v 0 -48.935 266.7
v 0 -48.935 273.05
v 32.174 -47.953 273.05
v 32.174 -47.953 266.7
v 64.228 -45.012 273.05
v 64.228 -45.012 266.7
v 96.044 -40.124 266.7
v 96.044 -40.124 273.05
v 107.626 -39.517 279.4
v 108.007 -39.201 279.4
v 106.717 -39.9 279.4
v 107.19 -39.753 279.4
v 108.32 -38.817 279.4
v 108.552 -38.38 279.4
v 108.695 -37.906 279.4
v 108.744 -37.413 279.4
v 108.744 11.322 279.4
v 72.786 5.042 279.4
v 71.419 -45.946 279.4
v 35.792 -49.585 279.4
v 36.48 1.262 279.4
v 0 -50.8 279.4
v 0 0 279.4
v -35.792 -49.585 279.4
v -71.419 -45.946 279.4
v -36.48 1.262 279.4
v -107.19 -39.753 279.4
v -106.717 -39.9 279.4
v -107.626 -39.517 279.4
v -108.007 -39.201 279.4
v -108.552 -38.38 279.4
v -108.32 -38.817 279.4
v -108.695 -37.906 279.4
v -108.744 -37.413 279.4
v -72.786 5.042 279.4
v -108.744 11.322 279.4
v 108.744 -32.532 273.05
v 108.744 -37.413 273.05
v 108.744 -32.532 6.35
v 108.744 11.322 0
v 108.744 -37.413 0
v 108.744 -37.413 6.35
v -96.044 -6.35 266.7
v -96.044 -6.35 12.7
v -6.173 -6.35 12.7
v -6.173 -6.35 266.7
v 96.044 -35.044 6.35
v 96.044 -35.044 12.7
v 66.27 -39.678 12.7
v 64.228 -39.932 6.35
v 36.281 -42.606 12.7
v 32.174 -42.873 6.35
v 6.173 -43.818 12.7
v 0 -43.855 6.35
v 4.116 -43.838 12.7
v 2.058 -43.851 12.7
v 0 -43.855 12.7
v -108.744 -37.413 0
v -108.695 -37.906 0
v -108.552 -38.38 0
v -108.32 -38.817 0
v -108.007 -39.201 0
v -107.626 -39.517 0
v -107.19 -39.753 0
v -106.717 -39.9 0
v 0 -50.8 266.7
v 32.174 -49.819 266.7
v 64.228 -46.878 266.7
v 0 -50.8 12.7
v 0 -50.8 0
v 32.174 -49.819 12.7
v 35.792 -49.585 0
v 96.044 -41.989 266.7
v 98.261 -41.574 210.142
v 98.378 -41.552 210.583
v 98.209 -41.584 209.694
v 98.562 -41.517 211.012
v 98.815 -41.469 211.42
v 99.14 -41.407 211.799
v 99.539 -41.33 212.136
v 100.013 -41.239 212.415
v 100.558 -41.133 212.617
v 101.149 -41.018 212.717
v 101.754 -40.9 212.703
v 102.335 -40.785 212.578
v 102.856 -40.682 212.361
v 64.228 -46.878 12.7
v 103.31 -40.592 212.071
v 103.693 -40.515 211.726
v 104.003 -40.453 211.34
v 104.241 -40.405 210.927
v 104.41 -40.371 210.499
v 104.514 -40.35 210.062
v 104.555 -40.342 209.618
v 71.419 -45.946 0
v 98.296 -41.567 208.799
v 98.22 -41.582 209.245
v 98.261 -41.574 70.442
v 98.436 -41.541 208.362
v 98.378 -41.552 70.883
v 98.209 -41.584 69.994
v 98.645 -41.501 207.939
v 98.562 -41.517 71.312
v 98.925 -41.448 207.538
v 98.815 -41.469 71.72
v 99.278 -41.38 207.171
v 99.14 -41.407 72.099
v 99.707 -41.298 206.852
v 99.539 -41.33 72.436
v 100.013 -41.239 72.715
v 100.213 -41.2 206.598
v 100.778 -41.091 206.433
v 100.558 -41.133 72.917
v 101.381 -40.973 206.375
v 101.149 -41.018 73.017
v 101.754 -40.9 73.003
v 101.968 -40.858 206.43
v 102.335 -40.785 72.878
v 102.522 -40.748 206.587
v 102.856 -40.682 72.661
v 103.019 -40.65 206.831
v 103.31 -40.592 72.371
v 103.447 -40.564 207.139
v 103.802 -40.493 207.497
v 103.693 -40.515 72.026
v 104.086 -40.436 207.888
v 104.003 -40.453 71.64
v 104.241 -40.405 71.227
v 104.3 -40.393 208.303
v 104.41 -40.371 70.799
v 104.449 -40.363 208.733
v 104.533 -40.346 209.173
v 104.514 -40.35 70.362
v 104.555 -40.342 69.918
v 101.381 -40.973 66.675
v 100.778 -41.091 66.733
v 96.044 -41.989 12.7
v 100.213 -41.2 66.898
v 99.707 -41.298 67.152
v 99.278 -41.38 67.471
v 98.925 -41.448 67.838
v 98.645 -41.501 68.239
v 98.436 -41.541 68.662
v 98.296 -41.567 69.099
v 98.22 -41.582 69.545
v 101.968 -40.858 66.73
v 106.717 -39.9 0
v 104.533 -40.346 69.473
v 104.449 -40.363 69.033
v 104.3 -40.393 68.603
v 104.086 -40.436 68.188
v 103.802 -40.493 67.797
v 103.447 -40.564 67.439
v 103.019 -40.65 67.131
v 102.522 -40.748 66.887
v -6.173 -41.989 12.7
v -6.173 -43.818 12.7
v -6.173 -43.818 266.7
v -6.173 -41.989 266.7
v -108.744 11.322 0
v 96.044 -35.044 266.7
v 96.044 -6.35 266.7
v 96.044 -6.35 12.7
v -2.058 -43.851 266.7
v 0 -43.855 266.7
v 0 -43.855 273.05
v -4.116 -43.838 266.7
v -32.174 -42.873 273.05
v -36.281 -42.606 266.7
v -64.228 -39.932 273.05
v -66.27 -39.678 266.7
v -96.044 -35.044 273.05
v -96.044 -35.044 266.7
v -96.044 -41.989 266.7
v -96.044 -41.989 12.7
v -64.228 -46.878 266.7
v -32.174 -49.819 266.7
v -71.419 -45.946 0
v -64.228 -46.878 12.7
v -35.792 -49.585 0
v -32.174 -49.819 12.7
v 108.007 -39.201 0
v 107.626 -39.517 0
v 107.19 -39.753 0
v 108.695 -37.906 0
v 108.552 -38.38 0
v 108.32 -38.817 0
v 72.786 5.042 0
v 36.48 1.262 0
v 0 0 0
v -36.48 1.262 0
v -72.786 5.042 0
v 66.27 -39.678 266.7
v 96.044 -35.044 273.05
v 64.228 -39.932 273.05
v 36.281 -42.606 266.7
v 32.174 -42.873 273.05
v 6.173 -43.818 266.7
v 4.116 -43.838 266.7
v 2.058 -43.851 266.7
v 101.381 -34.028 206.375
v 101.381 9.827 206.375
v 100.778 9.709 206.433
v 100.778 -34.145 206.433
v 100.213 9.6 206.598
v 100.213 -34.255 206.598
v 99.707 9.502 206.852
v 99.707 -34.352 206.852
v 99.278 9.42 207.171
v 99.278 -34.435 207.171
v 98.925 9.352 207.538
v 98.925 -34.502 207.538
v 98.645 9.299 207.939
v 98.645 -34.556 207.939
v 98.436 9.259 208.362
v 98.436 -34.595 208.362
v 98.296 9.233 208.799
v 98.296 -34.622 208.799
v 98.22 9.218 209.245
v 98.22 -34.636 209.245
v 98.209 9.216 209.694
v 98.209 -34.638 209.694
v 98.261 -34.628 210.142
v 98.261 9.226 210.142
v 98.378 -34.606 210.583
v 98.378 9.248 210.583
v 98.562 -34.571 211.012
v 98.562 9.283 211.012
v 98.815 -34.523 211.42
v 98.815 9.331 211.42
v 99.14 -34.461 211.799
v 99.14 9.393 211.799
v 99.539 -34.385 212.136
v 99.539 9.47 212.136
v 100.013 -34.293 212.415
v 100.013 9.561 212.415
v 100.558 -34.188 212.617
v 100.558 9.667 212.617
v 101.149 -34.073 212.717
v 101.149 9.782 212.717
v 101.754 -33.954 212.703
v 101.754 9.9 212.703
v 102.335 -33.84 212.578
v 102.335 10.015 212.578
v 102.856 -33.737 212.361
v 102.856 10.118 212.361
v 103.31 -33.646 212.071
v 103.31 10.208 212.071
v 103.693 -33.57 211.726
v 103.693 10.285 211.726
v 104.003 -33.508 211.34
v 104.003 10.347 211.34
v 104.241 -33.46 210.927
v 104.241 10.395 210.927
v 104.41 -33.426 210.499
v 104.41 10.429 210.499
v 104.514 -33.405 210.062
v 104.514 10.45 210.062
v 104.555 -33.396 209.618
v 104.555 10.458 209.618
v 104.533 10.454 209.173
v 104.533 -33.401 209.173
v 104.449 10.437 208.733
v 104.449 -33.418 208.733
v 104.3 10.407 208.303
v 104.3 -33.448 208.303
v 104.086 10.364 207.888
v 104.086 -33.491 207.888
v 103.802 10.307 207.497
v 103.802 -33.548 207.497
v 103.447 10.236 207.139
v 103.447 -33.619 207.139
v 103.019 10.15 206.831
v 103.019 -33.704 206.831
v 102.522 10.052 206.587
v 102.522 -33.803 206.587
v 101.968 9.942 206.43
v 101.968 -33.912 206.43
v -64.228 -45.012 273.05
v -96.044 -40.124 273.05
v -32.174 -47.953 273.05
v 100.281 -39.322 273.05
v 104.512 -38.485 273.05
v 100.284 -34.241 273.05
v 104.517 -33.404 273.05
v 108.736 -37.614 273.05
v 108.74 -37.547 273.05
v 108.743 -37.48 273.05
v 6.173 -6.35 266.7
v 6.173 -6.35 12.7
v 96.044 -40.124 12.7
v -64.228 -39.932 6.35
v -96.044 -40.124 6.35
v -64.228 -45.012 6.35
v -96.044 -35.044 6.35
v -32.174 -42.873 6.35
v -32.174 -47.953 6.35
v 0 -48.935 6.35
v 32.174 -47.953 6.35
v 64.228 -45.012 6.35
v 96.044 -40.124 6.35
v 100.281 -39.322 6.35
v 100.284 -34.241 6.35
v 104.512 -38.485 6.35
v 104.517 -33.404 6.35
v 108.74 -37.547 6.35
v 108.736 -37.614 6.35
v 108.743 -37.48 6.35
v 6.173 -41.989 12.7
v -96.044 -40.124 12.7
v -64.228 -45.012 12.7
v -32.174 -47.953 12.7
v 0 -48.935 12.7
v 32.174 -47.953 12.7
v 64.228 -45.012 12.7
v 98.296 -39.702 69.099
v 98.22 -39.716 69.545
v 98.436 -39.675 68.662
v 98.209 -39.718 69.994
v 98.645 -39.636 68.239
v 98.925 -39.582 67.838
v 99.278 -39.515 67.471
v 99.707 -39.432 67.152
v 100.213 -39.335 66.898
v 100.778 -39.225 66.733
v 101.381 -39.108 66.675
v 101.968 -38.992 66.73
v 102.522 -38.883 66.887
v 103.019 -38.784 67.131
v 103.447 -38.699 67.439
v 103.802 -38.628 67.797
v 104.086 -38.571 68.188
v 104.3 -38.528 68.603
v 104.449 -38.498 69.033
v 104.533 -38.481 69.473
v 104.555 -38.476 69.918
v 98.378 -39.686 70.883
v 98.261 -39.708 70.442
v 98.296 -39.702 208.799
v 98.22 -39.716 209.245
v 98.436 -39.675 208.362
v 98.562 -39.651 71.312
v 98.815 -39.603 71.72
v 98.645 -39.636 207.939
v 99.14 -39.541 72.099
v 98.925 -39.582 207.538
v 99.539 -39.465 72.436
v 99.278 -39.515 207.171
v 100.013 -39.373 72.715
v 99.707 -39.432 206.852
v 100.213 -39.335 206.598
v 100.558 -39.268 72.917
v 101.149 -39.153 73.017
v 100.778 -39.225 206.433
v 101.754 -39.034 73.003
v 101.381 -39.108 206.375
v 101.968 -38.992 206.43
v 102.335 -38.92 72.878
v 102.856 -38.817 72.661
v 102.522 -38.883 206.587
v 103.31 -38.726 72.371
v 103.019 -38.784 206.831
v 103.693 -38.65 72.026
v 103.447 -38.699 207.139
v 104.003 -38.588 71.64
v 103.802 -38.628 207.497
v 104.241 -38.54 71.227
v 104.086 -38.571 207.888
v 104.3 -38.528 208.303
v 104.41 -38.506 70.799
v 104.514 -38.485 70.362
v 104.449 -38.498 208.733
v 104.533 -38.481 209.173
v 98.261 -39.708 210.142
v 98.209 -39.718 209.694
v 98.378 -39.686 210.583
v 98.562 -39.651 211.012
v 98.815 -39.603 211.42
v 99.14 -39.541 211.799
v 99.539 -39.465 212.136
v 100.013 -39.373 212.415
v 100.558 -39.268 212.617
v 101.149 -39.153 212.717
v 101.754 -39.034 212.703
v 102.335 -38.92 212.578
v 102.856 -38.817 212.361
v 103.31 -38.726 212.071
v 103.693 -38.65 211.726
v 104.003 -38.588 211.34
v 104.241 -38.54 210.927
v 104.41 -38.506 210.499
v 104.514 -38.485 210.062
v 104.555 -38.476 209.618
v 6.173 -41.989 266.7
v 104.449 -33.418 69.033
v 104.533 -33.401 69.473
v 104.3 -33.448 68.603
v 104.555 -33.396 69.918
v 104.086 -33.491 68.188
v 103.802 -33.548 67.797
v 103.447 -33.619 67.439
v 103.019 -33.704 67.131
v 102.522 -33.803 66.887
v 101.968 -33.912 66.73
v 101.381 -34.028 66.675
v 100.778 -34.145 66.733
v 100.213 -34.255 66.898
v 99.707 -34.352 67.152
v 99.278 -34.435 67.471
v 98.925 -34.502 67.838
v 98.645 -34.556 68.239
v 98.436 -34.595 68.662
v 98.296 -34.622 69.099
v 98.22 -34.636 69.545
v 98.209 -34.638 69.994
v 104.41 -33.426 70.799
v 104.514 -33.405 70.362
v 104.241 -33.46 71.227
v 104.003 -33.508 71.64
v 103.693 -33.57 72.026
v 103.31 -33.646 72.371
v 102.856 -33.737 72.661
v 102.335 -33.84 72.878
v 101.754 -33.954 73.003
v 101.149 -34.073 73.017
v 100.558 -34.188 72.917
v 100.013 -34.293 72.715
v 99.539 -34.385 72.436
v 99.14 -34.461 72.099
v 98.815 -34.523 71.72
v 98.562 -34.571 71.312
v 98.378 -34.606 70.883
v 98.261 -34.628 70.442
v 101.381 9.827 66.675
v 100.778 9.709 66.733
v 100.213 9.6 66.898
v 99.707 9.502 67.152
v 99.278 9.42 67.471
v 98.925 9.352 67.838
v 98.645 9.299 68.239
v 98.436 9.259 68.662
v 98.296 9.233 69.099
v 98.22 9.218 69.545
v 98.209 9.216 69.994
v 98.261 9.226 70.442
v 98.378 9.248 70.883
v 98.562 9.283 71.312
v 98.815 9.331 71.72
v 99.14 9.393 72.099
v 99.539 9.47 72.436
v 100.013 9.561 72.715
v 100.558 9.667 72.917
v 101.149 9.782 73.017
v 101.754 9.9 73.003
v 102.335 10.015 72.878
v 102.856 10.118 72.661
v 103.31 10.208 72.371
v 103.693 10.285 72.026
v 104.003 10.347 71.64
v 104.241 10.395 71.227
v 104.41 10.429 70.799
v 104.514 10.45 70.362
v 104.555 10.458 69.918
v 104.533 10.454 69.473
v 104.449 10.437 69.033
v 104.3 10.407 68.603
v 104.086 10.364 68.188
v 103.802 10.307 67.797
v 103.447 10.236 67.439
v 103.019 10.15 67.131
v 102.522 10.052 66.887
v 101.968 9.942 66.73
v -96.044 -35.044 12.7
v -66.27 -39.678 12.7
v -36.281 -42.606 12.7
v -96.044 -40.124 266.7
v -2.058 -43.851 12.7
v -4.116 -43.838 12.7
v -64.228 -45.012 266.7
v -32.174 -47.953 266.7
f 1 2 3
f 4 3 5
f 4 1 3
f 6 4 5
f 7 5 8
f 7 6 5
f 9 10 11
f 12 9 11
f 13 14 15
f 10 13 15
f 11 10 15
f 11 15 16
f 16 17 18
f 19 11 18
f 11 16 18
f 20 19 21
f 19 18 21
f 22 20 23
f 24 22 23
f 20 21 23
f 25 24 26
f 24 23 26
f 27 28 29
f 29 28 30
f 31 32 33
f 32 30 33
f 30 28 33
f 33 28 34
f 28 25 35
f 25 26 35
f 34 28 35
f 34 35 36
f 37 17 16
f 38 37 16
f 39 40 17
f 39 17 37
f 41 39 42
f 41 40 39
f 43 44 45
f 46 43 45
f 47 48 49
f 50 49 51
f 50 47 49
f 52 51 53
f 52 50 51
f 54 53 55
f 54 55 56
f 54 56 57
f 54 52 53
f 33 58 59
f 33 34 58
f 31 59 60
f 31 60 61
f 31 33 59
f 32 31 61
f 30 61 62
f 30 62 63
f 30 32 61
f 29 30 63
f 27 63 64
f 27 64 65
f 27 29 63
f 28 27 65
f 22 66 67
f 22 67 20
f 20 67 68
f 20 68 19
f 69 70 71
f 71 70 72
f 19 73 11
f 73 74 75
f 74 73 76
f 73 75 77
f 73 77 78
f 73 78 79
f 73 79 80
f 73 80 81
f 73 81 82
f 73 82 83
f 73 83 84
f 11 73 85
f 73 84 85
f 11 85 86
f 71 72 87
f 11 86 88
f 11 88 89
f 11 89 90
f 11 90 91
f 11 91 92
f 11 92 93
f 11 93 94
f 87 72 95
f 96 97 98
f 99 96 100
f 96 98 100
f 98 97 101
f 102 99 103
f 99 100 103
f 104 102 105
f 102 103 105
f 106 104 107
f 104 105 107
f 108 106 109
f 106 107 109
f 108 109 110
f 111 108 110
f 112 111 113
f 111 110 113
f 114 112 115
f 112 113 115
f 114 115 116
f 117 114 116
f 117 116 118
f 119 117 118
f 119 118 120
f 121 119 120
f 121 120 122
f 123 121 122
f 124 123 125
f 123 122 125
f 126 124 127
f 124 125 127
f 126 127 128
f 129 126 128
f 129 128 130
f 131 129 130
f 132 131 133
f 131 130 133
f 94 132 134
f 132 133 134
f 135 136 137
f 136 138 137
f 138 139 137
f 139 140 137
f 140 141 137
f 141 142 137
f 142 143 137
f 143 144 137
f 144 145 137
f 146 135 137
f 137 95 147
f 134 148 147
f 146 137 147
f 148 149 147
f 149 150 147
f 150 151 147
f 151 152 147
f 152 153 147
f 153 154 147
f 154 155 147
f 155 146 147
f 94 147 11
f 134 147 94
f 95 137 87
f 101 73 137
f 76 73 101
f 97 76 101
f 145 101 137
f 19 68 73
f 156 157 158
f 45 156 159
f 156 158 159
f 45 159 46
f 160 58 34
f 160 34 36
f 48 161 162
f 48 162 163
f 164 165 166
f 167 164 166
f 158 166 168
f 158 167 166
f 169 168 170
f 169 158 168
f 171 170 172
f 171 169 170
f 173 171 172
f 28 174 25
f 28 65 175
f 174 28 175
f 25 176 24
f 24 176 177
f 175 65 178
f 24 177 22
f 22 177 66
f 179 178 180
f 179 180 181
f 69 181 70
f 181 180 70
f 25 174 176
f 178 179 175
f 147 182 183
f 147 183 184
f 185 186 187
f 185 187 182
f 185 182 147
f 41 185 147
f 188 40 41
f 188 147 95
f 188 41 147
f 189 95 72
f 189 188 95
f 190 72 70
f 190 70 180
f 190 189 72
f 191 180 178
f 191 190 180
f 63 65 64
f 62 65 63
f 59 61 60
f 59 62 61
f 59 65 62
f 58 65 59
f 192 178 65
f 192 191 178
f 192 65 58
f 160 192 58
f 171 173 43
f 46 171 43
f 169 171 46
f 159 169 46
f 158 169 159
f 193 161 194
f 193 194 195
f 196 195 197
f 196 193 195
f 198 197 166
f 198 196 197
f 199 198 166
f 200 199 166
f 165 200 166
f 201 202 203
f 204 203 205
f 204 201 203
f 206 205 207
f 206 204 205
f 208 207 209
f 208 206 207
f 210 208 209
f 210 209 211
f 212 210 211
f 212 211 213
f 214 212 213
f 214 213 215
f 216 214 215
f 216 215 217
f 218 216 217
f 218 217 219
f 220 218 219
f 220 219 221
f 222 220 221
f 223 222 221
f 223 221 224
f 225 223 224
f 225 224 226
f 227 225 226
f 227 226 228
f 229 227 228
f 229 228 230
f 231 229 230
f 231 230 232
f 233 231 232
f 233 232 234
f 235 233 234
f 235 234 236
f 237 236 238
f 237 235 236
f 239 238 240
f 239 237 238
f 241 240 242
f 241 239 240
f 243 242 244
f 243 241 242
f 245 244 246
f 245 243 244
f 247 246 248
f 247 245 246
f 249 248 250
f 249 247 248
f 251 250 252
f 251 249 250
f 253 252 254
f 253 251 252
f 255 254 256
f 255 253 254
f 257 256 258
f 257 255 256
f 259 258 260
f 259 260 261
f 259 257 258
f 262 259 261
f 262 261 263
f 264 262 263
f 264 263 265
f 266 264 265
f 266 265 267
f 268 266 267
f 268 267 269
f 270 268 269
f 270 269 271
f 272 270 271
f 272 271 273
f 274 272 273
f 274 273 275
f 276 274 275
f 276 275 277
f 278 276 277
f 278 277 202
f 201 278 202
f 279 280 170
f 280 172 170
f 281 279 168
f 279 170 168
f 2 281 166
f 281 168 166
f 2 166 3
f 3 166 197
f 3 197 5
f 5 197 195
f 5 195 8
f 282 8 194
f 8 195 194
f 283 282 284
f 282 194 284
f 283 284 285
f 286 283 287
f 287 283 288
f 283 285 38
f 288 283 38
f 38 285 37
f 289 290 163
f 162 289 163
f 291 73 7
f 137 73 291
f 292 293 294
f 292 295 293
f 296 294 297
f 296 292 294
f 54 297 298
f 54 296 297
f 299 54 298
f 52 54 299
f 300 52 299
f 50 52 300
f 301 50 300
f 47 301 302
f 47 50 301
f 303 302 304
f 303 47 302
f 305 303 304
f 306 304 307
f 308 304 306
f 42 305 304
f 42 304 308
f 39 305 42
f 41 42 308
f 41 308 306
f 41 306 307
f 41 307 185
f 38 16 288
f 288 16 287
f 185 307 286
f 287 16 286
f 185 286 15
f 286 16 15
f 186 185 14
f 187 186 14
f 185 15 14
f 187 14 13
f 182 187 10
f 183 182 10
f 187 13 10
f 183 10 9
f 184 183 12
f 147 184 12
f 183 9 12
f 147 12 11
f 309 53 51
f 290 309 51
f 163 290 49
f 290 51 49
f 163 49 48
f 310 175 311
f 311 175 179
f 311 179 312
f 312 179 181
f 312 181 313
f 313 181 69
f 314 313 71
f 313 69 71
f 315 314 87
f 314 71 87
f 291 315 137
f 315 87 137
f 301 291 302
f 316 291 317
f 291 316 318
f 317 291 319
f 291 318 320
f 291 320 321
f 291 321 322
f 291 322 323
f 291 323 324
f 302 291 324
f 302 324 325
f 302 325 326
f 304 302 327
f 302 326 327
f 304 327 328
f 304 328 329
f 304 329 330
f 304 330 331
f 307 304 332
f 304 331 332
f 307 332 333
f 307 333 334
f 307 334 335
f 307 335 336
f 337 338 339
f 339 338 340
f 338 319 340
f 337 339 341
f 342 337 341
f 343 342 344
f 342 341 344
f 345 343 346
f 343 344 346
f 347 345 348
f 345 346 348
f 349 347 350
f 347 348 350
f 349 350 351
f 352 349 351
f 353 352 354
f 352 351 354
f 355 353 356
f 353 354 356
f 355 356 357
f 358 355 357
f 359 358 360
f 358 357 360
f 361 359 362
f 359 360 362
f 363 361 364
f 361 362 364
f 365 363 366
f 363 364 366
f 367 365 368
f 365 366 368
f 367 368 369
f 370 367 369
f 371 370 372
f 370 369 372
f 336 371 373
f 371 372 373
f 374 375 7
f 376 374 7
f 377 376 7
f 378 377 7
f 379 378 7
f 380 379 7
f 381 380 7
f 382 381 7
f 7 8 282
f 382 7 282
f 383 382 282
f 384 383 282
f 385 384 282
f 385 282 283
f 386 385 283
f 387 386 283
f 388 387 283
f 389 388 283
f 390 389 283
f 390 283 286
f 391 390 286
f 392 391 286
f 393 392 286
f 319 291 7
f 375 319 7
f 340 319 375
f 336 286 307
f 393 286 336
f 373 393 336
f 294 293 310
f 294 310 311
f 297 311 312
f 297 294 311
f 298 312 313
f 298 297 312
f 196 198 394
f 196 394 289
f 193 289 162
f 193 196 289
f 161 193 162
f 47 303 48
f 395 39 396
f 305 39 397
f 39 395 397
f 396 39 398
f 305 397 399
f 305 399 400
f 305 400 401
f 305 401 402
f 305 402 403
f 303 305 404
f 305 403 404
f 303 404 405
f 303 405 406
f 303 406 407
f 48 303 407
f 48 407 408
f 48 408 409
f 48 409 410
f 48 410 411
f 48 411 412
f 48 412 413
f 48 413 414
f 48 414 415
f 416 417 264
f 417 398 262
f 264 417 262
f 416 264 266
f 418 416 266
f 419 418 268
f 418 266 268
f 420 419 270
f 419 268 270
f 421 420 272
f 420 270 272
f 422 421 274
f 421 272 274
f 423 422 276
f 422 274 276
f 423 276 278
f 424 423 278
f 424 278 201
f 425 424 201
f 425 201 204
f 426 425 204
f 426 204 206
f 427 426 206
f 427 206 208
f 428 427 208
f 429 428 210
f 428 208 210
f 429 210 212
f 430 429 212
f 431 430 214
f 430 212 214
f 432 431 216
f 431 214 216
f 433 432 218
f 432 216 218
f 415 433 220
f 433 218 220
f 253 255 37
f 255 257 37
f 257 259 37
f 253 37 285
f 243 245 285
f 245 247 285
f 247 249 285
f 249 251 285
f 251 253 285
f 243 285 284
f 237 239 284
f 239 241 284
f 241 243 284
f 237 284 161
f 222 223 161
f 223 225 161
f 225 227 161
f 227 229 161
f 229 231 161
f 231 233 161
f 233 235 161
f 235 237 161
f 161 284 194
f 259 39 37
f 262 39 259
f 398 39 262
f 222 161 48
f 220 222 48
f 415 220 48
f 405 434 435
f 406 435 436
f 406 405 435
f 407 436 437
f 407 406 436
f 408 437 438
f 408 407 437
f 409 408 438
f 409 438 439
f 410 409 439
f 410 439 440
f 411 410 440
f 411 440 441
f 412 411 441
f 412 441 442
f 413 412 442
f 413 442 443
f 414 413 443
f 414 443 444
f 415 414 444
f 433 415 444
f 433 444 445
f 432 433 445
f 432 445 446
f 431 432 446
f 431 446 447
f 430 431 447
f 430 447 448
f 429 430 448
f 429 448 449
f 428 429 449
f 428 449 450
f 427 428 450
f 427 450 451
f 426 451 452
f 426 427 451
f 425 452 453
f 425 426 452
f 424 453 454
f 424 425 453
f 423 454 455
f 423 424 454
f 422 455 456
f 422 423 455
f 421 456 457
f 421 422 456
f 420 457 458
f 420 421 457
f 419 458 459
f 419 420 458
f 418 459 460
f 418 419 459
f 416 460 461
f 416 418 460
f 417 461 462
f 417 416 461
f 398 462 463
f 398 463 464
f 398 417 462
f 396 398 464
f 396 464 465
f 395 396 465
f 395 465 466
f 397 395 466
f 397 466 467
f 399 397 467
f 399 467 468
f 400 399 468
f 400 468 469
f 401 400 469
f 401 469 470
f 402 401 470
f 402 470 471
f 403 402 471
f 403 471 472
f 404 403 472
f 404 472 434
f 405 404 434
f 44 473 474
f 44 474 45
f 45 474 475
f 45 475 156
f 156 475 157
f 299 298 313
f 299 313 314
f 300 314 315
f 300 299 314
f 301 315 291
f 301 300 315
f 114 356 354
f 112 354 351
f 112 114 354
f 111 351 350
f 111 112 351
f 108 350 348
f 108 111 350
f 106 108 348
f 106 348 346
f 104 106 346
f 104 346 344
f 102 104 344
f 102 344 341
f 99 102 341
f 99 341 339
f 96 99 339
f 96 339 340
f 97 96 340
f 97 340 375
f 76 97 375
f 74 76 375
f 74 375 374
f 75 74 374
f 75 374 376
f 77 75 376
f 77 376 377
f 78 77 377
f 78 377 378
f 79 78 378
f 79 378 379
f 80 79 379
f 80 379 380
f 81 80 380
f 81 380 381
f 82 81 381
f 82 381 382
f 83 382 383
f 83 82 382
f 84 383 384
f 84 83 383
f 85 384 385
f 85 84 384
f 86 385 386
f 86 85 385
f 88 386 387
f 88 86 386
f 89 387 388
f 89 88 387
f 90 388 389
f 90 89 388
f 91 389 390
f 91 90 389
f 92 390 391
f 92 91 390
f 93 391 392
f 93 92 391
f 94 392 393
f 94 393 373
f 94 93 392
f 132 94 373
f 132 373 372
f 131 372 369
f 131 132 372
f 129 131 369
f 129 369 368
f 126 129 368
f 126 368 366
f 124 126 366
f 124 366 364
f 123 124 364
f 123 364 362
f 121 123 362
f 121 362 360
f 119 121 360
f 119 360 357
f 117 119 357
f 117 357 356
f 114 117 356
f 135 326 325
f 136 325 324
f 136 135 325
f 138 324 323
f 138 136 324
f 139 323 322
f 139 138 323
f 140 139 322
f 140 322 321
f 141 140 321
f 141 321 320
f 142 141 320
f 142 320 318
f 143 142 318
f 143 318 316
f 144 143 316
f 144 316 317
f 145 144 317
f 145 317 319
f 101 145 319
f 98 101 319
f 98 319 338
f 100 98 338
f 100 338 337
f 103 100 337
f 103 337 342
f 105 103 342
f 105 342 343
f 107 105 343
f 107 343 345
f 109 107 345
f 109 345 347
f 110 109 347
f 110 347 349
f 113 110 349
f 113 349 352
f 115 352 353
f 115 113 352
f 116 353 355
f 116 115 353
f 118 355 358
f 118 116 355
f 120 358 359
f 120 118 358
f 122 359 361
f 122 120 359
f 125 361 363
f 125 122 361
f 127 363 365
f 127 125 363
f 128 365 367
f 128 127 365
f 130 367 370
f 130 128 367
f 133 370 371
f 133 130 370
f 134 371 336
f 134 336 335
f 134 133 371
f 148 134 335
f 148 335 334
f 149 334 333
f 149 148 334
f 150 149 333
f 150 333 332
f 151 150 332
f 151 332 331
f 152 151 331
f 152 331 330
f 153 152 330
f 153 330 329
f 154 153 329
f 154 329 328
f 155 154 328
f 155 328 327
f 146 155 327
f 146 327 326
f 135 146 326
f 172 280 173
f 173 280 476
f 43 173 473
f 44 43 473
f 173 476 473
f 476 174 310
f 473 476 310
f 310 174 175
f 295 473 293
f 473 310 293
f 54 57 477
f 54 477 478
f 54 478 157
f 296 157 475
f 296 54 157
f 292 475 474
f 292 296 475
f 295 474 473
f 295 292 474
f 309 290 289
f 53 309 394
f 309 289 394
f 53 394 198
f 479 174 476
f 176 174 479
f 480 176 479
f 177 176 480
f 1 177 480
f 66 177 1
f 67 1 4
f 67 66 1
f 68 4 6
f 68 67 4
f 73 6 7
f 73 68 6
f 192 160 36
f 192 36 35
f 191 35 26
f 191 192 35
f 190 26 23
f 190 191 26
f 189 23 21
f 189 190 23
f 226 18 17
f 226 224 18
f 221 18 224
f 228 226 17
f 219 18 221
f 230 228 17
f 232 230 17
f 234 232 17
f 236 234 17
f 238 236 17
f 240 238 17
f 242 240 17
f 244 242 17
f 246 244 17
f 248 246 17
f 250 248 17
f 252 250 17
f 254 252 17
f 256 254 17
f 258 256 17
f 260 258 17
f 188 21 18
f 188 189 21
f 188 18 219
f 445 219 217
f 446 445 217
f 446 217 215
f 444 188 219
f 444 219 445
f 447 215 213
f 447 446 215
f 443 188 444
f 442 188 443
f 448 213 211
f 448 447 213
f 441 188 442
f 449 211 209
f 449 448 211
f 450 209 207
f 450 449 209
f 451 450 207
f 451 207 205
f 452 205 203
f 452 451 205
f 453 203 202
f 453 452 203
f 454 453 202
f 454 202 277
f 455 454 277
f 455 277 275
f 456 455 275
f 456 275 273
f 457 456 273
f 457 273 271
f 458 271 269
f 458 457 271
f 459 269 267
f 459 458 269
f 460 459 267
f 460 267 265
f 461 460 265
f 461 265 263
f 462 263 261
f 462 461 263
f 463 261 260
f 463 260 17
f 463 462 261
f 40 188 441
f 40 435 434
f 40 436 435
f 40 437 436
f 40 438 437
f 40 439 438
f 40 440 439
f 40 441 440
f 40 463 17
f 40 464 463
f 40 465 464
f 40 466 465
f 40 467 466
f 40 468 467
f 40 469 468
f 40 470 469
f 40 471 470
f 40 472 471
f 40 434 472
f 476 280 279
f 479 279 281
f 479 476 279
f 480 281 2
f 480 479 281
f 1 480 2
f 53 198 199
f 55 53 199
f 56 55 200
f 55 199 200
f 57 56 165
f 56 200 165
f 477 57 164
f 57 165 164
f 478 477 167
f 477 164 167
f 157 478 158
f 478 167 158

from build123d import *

# Parameters (mm, degrees)
BOSS_EXTRUDE2_DEPTH     = 279.4
CUT_EXTRUDE1_DEPTH      = 279.4
FILLET1_R               = 2.54
SKETCH7_W               = 192.0875
SKETCH7_H               = 254
CUT_EXTRUDE2_DEPTH      = 44.45
SKETCH8_W               = 6.173248721
SKETCH8_H               = 35.639061591
BOSS_EXTRUDE3_DEPTH     = 258.064
CUT_EXTRUDE3_DEPTH      = 260.35
CUT_EXTRUDE3_DEPTH_BACK = 6.35
CUT_EXTRUDE4_DEPTH      = 260.35
CUT_EXTRUDE4_DEPTH_BACK = 6.35
BOSS_EXTRUDE4_DEPTH     = 254
SKETCH18_R              = 3.175
CUT_EXTRUDE5_DEPTH      = 71.12


with BuildPart() as part:
    # CrossSection → Boss-Extrude2 (new body)
    with BuildSketch(Plane.XY):
        with BuildLine():
            Line((108.74375, 11.322324676), (108.74375, -50.8))
            Line((108.74375, -50.8), (-108.74375, -50.8))
            Line((-108.74375, -50.8), (-108.74375, 11.322324676))
            ThreePointArc((-108.74375, 11.322324676), (0, 0), (108.74375, 11.322324676))
        make_face()
    extrude(amount=BOSS_EXTRUDE2_DEPTH)

    # Sketch4 → Cut-Extrude1 (cut)
    with BuildSketch(Plane(origin=(0, 0, 0), x_dir=(-1, 0, 0), z_dir=(0, 0, -1))):
        with BuildLine():
            ThreePointArc((0, -50.8), (-54.665798723, -47.96178867), (-108.74375, -39.477675324))
            Line((-108.74375, -39.477675324), (-108.74375, -50.8))
            Line((-108.74375, -50.8), (0, -50.8))
        make_face()
        with BuildLine():
            ThreePointArc((108.74375, -39.477675324), (54.665798723, -47.96178867), (0, -50.8))
            Line((0, -50.8), (108.74375, -50.8))
            Line((108.74375, -50.8), (108.74375, -39.477675324))
        make_face()
    extrude(amount=-CUT_EXTRUDE1_DEPTH, mode=Mode.SUBTRACT)

    # Fillet1
    fillet1_edges = [part.edges().sort_by_distance(p)[0] for p in [
        (108.74375, -39.477675324, 139.7),
        (-108.74375, -39.477675324, 139.7),
    ]]
    fillet(fillet1_edges, radius=FILLET1_R)

    # Sketch7 → Cut-Extrude2 (cut)
    with BuildSketch(Plane(origin=(0, -50.8, 0), x_dir=(1, 0, 0), z_dir=(0, 1, 0))):
        with Locations((0, -139.7)):
            Rectangle(SKETCH7_W, SKETCH7_H)
    extrude(amount=CUT_EXTRUDE2_DEPTH, mode=Mode.SUBTRACT)

    # Sketch8 → Boss-Extrude3 (add)
    with BuildSketch(Plane.XY.offset(12.7)):
        with Locations((3.086624361, -24.169530796)):
            Rectangle(SKETCH8_W, SKETCH8_H)
        with Locations((-3.086624361, -24.169530796)):
            Rectangle(SKETCH8_W, SKETCH8_H)
    extrude(amount=BOSS_EXTRUDE3_DEPTH)

    # Sketch13 → Cut-Extrude3 (cut, two sides: drawn at the far end of the back side and taken through both)
    with BuildSketch(Plane.XY.offset(12.7).offset(-CUT_EXTRUDE3_DEPTH_BACK)):
        with BuildLine():
            ThreePointArc((-96.04375, -40.123592373), (-48.223527841, -46.727181022), (0, -48.934530782))
            Line((0, -48.934530782), (0, -43.854530782))
            ThreePointArc((0, -43.854530782), (-48.223527841, -41.647181022), (-96.04375, -35.043592373))
            Line((-96.04375, -35.043592373), (-96.04375, -37.583592373))
            Line((-96.04375, -37.583592373), (-96.04375, -40.123592373))
        make_face()
        with BuildLine():
            Line((0, -43.854530782), (0, -48.934530782))
            ThreePointArc((0, -48.934530782), (48.223527841, -46.727181022), (96.04375, -40.123592373))
            Line((96.04375, -40.123592373), (96.04375, -37.583592373))
            Line((96.04375, -37.583592373), (96.04375, -35.043592373))
            ThreePointArc((96.04375, -35.043592373), (48.223527841, -41.647181022), (0, -43.854530782))
        make_face()
    extrude(amount=CUT_EXTRUDE3_DEPTH + CUT_EXTRUDE3_DEPTH_BACK, mode=Mode.SUBTRACT)

    # Sketch14 → Cut-Extrude4 (cut, two sides: drawn at the far end of the back side and taken through both)
    with BuildSketch(Plane(origin=(0, 0, 266.7), x_dir=(-1, 0, 0), z_dir=(0, 0, -1)).offset(-CUT_EXTRUDE4_DEPTH_BACK)):
        with BuildLine():
            Line((96.04375, -35.043592373), (96.04375, -40.123592373))
            ThreePointArc((96.04375, -40.123592373), (-28.026510339, -48.189989717), (-150.541934286, -27.012946445))
            Line((-150.541934286, -27.012946445), (-150.541934286, -21.932946445))
            ThreePointArc((-150.541934286, -21.932946445), (-28.026510339, -43.109989717), (96.04375, -35.043592373))
        make_face()
    extrude(amount=CUT_EXTRUDE4_DEPTH + CUT_EXTRUDE4_DEPTH_BACK, mode=Mode.SUBTRACT)

    # Sketch15 → Boss-Extrude4 (add)
    with BuildSketch(Plane(origin=(0, 0, 266.7), x_dir=(-1, 0, 0), z_dir=(0, 0, -1))):
        with BuildLine():
            Line((6.173248721, -43.818432493), (6.173248721, -41.989061591))
            Line((6.173248721, -41.989061591), (-6.173248721, -41.989061591))
            Line((-6.173248721, -41.989061591), (-6.173248721, -43.818432493))
            ThreePointArc((-6.173248721, -43.818432493), (0, -43.854530782), (6.173248721, -43.818432493))
        make_face()
    extrude(amount=BOSS_EXTRUDE4_DEPTH)

    # Sketch18 → Cut-Extrude5 (cut)
    with BuildSketch(Plane(origin=(0, -50.8, 0), x_dir=(1, 0, 0), z_dir=(0, 1, 0))):
        with Locations(Location((101.380501252, -209.55, 0), (0, 0, 90))):
            Circle(SKETCH18_R)
        with Locations(Location((101.380501252, -69.85, 0), (0, 0, 90))):
            Circle(SKETCH18_R)
    extrude(amount=CUT_EXTRUDE5_DEPTH, mode=Mode.SUBTRACT)


solid = part.part
